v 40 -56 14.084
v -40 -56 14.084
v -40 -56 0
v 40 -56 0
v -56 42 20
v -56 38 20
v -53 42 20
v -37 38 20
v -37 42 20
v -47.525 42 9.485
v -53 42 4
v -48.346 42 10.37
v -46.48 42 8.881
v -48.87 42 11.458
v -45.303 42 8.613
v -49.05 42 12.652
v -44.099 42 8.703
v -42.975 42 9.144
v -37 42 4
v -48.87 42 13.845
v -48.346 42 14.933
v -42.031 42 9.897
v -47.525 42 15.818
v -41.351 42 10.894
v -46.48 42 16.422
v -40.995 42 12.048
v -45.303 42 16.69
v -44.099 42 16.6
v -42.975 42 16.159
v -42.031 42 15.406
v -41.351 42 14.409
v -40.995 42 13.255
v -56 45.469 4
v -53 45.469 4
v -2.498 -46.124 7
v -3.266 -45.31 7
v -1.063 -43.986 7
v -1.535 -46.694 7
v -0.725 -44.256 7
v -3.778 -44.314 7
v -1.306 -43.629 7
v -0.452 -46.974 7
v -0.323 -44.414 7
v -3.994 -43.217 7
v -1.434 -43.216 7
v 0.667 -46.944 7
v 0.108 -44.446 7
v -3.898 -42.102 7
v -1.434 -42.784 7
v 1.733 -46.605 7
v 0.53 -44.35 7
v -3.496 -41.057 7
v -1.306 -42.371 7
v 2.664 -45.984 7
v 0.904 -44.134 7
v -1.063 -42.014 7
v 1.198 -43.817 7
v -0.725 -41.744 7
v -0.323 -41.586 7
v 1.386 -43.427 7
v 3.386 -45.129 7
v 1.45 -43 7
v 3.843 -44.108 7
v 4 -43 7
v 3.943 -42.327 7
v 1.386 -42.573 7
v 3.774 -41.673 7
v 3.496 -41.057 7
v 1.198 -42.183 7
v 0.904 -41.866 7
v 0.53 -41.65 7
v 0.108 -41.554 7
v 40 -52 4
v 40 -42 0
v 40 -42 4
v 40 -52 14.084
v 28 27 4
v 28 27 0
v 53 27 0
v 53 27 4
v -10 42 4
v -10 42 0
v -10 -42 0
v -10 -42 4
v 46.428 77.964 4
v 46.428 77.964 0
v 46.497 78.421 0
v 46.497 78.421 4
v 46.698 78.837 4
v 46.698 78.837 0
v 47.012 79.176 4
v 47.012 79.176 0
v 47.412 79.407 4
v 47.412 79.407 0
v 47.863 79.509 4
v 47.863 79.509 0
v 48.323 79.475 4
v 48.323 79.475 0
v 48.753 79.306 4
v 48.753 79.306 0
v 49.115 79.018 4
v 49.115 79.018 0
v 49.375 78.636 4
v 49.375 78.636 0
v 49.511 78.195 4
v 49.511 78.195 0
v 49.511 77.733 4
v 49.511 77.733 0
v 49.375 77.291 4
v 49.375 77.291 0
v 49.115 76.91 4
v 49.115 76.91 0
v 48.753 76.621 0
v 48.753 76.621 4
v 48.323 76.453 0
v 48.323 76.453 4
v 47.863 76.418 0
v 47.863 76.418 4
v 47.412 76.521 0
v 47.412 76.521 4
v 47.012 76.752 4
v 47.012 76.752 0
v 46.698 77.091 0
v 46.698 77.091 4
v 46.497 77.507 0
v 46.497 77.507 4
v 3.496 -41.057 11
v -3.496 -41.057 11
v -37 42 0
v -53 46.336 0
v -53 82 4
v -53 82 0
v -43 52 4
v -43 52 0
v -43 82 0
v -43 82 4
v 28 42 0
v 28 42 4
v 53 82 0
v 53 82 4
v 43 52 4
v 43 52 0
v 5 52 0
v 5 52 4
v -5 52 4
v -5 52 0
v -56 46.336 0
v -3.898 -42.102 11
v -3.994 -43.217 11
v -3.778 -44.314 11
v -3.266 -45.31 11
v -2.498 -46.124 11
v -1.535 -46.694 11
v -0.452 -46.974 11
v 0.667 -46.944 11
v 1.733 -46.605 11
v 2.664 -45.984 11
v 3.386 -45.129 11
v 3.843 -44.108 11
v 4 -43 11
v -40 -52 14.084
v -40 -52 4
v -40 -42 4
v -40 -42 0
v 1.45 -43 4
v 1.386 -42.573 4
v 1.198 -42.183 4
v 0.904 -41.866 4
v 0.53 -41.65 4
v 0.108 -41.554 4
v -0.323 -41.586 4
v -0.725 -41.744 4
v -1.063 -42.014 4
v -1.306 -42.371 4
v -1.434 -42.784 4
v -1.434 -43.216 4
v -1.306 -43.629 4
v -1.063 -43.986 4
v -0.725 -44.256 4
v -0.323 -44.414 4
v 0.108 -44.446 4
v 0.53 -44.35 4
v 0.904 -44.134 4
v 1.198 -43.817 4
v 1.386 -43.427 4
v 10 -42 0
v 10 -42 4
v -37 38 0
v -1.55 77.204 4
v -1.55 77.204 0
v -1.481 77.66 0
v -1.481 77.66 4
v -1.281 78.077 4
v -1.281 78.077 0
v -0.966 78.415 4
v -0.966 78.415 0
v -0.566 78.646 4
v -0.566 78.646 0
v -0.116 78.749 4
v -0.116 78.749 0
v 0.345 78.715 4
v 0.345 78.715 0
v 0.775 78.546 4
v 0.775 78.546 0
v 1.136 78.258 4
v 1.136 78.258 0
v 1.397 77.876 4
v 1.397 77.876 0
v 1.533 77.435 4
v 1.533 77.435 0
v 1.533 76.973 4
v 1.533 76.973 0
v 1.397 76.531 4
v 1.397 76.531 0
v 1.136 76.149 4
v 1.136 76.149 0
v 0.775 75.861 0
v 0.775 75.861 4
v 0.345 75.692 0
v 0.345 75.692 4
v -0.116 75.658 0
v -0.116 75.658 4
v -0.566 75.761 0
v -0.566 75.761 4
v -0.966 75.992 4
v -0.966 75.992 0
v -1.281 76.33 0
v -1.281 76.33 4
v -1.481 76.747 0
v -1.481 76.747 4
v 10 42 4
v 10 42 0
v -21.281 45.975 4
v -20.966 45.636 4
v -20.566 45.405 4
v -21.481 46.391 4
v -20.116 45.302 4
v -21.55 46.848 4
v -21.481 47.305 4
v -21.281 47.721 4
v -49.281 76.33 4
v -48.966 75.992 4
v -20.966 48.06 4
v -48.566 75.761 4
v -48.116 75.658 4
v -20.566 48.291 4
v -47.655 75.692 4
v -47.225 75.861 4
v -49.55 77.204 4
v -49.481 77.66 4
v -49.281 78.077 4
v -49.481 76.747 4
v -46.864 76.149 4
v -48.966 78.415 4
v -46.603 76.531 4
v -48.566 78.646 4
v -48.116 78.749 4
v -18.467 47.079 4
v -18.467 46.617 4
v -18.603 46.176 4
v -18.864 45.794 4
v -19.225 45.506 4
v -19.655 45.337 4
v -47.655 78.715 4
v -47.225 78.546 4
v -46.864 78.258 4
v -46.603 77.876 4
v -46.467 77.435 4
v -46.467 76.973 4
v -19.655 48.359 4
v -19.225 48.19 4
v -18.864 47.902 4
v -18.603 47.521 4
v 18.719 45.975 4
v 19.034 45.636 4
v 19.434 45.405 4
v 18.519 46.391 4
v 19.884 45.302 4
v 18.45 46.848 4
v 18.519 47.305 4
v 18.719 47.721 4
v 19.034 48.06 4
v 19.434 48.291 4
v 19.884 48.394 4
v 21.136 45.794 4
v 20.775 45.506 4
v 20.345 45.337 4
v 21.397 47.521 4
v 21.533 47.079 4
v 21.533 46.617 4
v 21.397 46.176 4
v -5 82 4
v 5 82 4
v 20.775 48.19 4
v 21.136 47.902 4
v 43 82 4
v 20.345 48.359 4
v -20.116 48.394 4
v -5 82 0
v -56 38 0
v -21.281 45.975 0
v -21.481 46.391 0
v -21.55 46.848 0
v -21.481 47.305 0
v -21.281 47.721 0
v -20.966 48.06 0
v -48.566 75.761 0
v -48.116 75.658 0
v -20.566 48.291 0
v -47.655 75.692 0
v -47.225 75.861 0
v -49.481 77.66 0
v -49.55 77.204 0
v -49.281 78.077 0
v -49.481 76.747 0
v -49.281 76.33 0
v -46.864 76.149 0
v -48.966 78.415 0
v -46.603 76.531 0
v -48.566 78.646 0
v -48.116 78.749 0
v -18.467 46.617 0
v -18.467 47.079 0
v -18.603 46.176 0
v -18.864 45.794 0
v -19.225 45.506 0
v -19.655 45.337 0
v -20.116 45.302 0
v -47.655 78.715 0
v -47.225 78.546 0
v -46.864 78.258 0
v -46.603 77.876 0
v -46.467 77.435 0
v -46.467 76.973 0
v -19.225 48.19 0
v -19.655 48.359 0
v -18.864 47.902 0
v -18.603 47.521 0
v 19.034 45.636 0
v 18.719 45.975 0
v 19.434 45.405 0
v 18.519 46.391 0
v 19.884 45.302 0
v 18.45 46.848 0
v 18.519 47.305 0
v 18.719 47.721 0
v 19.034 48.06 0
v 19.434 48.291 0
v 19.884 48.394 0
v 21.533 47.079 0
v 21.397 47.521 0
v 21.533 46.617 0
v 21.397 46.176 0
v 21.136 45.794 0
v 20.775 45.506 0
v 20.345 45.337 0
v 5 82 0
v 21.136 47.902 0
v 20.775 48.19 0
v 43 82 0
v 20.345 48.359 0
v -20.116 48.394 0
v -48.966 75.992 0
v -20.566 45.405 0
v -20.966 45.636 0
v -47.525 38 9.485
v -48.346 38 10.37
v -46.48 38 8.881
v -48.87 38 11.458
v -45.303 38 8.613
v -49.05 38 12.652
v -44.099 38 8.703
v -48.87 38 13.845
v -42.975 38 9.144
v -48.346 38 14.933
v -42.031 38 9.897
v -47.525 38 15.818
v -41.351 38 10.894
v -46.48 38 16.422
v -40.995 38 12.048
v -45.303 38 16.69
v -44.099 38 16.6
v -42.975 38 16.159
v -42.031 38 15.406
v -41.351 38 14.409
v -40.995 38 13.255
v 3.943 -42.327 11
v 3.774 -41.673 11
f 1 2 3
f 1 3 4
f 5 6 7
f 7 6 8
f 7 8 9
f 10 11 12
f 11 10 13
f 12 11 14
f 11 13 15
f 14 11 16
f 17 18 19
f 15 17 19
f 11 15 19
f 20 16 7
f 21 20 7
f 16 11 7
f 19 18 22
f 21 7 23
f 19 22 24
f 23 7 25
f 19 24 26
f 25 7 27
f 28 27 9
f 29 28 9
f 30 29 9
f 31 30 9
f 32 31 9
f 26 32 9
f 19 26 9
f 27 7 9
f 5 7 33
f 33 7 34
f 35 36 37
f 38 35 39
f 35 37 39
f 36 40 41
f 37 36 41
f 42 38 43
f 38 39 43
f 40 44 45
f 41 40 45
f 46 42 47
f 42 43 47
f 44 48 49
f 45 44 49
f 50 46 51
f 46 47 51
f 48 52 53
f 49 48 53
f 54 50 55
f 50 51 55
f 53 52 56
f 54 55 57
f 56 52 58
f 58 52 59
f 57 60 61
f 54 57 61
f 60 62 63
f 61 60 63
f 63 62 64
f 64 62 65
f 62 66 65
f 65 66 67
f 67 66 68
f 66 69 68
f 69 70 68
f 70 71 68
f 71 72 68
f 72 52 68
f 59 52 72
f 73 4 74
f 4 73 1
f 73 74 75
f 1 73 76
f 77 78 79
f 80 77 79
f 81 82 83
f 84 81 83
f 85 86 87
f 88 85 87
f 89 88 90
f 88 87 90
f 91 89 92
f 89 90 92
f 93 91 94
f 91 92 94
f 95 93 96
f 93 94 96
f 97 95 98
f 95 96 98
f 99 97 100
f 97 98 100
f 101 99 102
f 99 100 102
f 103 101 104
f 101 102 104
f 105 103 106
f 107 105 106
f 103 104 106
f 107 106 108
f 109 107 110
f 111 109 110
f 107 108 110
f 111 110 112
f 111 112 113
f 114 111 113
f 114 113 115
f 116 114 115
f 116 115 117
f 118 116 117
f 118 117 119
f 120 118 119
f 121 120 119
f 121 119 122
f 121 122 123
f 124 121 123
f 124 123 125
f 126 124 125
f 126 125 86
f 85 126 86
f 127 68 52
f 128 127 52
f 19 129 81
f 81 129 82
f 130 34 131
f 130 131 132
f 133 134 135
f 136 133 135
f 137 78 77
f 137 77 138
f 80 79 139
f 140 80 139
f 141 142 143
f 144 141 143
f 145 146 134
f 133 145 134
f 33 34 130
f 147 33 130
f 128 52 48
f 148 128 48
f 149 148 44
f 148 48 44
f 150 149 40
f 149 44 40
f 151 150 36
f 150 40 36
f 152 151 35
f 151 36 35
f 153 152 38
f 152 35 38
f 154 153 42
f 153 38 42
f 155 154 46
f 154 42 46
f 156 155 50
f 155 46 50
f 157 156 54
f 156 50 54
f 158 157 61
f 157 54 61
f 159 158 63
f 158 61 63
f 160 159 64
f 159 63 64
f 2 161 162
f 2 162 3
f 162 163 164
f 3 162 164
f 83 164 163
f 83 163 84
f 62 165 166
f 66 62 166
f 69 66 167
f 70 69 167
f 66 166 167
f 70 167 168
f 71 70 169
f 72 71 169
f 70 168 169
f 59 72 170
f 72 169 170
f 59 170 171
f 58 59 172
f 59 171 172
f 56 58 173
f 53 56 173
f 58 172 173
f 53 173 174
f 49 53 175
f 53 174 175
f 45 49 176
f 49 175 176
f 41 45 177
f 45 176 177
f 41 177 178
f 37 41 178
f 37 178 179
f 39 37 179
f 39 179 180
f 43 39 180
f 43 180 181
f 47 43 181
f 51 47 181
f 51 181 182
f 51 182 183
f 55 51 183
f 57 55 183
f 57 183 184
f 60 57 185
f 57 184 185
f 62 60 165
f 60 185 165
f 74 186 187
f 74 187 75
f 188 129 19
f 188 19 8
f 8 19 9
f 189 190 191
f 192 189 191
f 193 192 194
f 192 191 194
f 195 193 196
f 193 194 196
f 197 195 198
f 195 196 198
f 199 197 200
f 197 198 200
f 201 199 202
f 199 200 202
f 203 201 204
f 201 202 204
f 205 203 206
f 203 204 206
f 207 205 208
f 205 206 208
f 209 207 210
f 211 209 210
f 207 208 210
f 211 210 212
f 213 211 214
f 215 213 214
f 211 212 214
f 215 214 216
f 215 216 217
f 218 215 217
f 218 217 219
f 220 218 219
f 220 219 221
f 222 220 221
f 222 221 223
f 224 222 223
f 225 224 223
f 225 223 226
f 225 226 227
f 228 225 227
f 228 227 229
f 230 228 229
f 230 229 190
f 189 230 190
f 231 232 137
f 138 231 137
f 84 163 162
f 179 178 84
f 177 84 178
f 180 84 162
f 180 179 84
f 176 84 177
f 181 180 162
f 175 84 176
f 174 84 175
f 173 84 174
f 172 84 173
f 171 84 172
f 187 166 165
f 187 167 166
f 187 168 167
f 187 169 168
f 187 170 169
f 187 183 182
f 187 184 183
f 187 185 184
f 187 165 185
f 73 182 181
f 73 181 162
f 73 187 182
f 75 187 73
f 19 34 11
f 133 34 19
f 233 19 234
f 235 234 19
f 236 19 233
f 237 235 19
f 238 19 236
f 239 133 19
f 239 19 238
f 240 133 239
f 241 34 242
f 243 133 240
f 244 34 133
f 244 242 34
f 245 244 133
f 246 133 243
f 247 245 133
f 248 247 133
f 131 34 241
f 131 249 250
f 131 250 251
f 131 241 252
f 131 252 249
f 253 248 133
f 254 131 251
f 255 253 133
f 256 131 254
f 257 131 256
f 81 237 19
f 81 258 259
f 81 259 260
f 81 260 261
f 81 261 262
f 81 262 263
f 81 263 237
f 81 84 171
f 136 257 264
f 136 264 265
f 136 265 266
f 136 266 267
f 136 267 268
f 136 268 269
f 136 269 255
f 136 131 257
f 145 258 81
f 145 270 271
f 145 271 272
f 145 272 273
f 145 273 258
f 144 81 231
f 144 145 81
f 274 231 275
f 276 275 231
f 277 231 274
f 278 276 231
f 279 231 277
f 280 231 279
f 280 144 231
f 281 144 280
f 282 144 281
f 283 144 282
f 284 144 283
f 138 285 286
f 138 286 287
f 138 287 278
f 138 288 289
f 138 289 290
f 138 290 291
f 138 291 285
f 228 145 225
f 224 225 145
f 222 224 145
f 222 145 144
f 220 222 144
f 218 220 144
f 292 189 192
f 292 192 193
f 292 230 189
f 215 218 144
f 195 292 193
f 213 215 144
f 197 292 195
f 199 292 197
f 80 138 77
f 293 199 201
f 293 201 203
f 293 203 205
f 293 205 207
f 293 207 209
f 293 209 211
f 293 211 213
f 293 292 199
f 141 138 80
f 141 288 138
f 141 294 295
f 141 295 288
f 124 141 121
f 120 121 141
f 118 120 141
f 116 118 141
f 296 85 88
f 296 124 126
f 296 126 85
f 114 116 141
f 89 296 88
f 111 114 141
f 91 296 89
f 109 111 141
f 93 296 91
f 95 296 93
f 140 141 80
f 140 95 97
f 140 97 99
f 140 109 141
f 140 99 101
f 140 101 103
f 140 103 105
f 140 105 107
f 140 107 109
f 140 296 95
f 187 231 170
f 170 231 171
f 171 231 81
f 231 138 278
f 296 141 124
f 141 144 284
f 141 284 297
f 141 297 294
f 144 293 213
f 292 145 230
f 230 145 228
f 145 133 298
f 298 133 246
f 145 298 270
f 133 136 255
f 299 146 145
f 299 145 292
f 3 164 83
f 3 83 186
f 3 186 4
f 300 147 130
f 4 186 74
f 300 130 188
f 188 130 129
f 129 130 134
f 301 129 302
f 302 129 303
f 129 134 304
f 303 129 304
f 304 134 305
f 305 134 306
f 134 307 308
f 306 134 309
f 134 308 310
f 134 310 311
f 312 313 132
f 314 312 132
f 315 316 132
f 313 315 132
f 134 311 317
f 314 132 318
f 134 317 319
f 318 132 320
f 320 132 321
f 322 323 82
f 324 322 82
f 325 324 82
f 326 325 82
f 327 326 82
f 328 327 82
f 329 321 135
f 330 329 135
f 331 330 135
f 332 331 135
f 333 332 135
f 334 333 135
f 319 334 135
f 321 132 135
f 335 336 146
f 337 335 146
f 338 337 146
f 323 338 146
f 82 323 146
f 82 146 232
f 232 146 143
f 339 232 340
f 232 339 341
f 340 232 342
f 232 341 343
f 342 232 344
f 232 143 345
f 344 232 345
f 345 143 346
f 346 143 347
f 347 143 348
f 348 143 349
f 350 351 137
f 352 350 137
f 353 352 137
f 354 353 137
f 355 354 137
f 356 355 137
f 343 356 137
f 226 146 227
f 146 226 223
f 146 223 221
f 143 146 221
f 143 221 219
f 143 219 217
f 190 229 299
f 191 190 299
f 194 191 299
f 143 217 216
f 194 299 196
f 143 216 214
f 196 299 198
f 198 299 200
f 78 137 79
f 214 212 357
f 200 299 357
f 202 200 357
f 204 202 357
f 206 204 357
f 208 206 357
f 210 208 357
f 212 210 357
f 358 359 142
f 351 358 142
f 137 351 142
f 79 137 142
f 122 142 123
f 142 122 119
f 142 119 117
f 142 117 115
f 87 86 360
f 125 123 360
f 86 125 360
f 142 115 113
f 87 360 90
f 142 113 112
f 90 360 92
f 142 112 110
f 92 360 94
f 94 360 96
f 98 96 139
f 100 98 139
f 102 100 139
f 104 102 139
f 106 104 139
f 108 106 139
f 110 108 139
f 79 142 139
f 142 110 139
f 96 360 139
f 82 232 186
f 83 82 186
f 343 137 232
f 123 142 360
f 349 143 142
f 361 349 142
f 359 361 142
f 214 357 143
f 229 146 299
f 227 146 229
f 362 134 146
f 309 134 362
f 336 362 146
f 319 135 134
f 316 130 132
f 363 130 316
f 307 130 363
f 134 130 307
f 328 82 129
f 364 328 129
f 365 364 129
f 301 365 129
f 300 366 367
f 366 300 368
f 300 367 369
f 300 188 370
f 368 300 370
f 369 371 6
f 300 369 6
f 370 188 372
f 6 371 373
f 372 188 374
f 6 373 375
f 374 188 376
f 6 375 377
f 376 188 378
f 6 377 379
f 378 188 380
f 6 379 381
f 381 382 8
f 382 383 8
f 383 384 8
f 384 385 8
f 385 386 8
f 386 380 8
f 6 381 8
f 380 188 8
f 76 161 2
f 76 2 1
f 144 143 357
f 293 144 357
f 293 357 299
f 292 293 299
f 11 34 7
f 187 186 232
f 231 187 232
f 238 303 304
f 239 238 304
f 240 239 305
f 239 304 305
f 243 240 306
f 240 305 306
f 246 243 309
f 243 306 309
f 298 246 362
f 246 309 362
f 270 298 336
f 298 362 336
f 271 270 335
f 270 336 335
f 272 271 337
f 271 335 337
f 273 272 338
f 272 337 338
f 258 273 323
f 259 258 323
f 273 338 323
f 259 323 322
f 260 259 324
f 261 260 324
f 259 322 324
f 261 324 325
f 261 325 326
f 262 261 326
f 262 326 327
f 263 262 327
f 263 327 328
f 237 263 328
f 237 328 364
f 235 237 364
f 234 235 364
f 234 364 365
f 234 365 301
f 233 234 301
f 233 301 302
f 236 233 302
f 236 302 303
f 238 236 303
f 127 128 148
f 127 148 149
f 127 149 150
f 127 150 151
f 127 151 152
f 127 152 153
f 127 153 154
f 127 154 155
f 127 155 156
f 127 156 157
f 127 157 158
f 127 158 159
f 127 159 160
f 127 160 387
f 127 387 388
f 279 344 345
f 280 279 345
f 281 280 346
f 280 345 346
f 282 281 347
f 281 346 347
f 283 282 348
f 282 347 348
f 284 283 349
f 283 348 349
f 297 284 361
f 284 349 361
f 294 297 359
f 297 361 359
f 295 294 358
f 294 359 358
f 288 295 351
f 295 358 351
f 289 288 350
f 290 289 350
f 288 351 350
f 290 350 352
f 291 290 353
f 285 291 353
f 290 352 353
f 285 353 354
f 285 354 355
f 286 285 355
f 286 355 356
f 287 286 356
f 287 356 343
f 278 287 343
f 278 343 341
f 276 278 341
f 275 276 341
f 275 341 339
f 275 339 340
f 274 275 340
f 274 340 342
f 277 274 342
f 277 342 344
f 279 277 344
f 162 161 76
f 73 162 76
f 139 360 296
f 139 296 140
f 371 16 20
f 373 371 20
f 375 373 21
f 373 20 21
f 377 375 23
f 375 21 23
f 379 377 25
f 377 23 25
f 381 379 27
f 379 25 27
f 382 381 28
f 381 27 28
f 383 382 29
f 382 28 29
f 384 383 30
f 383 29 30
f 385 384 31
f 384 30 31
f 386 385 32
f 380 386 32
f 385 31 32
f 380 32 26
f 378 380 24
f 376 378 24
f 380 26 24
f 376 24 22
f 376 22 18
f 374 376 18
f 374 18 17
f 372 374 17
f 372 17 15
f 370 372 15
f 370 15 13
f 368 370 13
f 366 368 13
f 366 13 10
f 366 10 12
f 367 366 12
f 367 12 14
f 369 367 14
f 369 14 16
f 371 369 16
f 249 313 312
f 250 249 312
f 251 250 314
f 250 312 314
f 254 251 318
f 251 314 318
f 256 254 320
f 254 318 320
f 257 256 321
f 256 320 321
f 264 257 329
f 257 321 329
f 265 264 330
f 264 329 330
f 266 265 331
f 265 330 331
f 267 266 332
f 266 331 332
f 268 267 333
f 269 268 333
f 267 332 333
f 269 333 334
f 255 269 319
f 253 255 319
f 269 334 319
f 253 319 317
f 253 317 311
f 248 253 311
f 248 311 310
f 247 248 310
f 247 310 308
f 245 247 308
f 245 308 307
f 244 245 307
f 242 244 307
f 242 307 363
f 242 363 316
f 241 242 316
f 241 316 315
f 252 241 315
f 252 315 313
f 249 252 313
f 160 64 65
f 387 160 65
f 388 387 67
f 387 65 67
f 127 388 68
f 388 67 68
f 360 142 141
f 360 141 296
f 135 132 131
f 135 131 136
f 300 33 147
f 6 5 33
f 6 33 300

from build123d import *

# Parameters (mm, degrees)
F0_W      = 10
F0_H      = 30
F0_W_2    = 5
F0_W_3    = 30
F0_H_2    = 10
F0_W_4    = 25
F0_H_3    = 15
F1_DEPTH  = 4
F2_W      = 16
F2_H      = 16
F2_H_2    = 4
F3_DEPTH  = 4
F5_D      = 8.1
F7_DEPTH  = 3
F8_W      = 80
F8_H      = 10.0841035172
F8_H_2    = 4
F9_DEPTH  = 4
F11_D     = 3.1
F12_R     = 1.45
F13_DEPTH = 3
F14_R     = 1.45
F15_DEPTH = 4
F17_D     = 3.1


with BuildPart() as f1:
    # F0 (on Top) → F1 (new body)
    with BuildSketch(Plane.XY):
        with Locations((-48, 67)):
            Rectangle(F0_W, F0_H)
        Polygon((-10, 42), (-10, 52), (-43, 52), (-53, 52), (-53, 42), align=None)
        with Locations((-2.5, 67)):
            Rectangle(F0_W_2, F0_H)
        with Locations((2.5, 67)):
            Rectangle(F0_W_2, F0_H)
        Polygon((-5, 52), (-10, 52), (-10, 42), (-10, -42), (-10, -52), (10, -52), (10, -42), (10, 42), (10, 52), (5, 52), (0, 52), align=None)
        with Locations((-25, -47)):
            Rectangle(F0_W_3, F0_H_2)
        with Locations((25, -47)):
            Rectangle(F0_W_3, F0_H_2)
        with Locations((40.5, 34.5)):
            Rectangle(F0_W_4, F0_H_3)
        Polygon((43, 52), (10, 52), (10, 42), (28, 42), (53, 42), (53, 52), align=None)
        with Locations((48, 67)):
            Rectangle(F0_W, F0_H)
    extrude(amount=F1_DEPTH)

    # F2 (on face) → F3 (join)
    with BuildSketch(Plane.XZ.offset(-42)):
        with Locations((-45, 12)):
            Rectangle(F2_W, F2_H)
        with Locations((-45, 2)):
            Rectangle(F2_W, F2_H_2)
    extrude(amount=F3_DEPTH)

    # F5 (through all)
    with Locations(Plane.XZ.offset(-38)):
        with Locations((-45, 12.6515012234)):
            Hole(F5_D / 2)

    # F6 (on face) → F7 (join)
    with BuildSketch(Plane(origin=(-53, 0, 0), x_dir=(0, -1, 0), z_dir=(-1, 0, 0))):
        Polygon((-42, 20), (-45.4689958334, 4), (-42, 4), align=None)
        Polygon((-45.4689958334, 4), (-46.3362447917, 0), (-38, 0), (-38, 20), (-42, 20), (-42, 4), align=None)
    extrude(amount=F7_DEPTH)

    # F8 (on face) → F9 (join)
    with BuildSketch(Plane.XZ.offset(52)):
        with Locations((0, 9.0420517586)):
            Rectangle(F8_W, F8_H)
        with Locations((0, 2)):
            Rectangle(F8_W, F8_H_2)
    extrude(amount=F9_DEPTH)

    # F11 (through all)
    with Locations(Plane.XY.offset(4)):
        with Locations((-20, 46.8481220305), (20, 46.8481220305), (-48, 77.2035785913), (0, 77.2035785913), (71.8699040711, 77.2035785913)):
            Hole(F11_D / 2)

    # F12 (on face) → F13 (join)
    with BuildSketch(Plane.XY.offset(4)):
        with Locations((0, -43)):
            Circle(F12_R)
    extrude(amount=F13_DEPTH)

    # F14 (on face) → F15 (join)
    with BuildSketch(Plane.XY.offset(7)):
        with BuildLine():
            ThreePointArc((-3.4964729281, -41.0571471845), (-1.0035208736, -46.8720725531), (4, -43))
            ThreePointArc((4, -43), (3.8720725531, -41.9964791264), (3.4964729281, -41.0571471845))
            Line((3.4964729281, -41.0571471845), (-3.4964729281, -41.0571471845))
        make_face()
        with Locations((0, -43)):
            Circle(F14_R, mode=Mode.SUBTRACT)
        with Locations((0, -43)):
            Circle(F14_R)
    extrude(amount=F15_DEPTH)

    # F17 (through all)
    with Locations(Plane.XY.offset(4)):
        with Locations((47.9784347117, 77.9637917876)):
            Hole(F17_D / 2)


solid = f1.part
